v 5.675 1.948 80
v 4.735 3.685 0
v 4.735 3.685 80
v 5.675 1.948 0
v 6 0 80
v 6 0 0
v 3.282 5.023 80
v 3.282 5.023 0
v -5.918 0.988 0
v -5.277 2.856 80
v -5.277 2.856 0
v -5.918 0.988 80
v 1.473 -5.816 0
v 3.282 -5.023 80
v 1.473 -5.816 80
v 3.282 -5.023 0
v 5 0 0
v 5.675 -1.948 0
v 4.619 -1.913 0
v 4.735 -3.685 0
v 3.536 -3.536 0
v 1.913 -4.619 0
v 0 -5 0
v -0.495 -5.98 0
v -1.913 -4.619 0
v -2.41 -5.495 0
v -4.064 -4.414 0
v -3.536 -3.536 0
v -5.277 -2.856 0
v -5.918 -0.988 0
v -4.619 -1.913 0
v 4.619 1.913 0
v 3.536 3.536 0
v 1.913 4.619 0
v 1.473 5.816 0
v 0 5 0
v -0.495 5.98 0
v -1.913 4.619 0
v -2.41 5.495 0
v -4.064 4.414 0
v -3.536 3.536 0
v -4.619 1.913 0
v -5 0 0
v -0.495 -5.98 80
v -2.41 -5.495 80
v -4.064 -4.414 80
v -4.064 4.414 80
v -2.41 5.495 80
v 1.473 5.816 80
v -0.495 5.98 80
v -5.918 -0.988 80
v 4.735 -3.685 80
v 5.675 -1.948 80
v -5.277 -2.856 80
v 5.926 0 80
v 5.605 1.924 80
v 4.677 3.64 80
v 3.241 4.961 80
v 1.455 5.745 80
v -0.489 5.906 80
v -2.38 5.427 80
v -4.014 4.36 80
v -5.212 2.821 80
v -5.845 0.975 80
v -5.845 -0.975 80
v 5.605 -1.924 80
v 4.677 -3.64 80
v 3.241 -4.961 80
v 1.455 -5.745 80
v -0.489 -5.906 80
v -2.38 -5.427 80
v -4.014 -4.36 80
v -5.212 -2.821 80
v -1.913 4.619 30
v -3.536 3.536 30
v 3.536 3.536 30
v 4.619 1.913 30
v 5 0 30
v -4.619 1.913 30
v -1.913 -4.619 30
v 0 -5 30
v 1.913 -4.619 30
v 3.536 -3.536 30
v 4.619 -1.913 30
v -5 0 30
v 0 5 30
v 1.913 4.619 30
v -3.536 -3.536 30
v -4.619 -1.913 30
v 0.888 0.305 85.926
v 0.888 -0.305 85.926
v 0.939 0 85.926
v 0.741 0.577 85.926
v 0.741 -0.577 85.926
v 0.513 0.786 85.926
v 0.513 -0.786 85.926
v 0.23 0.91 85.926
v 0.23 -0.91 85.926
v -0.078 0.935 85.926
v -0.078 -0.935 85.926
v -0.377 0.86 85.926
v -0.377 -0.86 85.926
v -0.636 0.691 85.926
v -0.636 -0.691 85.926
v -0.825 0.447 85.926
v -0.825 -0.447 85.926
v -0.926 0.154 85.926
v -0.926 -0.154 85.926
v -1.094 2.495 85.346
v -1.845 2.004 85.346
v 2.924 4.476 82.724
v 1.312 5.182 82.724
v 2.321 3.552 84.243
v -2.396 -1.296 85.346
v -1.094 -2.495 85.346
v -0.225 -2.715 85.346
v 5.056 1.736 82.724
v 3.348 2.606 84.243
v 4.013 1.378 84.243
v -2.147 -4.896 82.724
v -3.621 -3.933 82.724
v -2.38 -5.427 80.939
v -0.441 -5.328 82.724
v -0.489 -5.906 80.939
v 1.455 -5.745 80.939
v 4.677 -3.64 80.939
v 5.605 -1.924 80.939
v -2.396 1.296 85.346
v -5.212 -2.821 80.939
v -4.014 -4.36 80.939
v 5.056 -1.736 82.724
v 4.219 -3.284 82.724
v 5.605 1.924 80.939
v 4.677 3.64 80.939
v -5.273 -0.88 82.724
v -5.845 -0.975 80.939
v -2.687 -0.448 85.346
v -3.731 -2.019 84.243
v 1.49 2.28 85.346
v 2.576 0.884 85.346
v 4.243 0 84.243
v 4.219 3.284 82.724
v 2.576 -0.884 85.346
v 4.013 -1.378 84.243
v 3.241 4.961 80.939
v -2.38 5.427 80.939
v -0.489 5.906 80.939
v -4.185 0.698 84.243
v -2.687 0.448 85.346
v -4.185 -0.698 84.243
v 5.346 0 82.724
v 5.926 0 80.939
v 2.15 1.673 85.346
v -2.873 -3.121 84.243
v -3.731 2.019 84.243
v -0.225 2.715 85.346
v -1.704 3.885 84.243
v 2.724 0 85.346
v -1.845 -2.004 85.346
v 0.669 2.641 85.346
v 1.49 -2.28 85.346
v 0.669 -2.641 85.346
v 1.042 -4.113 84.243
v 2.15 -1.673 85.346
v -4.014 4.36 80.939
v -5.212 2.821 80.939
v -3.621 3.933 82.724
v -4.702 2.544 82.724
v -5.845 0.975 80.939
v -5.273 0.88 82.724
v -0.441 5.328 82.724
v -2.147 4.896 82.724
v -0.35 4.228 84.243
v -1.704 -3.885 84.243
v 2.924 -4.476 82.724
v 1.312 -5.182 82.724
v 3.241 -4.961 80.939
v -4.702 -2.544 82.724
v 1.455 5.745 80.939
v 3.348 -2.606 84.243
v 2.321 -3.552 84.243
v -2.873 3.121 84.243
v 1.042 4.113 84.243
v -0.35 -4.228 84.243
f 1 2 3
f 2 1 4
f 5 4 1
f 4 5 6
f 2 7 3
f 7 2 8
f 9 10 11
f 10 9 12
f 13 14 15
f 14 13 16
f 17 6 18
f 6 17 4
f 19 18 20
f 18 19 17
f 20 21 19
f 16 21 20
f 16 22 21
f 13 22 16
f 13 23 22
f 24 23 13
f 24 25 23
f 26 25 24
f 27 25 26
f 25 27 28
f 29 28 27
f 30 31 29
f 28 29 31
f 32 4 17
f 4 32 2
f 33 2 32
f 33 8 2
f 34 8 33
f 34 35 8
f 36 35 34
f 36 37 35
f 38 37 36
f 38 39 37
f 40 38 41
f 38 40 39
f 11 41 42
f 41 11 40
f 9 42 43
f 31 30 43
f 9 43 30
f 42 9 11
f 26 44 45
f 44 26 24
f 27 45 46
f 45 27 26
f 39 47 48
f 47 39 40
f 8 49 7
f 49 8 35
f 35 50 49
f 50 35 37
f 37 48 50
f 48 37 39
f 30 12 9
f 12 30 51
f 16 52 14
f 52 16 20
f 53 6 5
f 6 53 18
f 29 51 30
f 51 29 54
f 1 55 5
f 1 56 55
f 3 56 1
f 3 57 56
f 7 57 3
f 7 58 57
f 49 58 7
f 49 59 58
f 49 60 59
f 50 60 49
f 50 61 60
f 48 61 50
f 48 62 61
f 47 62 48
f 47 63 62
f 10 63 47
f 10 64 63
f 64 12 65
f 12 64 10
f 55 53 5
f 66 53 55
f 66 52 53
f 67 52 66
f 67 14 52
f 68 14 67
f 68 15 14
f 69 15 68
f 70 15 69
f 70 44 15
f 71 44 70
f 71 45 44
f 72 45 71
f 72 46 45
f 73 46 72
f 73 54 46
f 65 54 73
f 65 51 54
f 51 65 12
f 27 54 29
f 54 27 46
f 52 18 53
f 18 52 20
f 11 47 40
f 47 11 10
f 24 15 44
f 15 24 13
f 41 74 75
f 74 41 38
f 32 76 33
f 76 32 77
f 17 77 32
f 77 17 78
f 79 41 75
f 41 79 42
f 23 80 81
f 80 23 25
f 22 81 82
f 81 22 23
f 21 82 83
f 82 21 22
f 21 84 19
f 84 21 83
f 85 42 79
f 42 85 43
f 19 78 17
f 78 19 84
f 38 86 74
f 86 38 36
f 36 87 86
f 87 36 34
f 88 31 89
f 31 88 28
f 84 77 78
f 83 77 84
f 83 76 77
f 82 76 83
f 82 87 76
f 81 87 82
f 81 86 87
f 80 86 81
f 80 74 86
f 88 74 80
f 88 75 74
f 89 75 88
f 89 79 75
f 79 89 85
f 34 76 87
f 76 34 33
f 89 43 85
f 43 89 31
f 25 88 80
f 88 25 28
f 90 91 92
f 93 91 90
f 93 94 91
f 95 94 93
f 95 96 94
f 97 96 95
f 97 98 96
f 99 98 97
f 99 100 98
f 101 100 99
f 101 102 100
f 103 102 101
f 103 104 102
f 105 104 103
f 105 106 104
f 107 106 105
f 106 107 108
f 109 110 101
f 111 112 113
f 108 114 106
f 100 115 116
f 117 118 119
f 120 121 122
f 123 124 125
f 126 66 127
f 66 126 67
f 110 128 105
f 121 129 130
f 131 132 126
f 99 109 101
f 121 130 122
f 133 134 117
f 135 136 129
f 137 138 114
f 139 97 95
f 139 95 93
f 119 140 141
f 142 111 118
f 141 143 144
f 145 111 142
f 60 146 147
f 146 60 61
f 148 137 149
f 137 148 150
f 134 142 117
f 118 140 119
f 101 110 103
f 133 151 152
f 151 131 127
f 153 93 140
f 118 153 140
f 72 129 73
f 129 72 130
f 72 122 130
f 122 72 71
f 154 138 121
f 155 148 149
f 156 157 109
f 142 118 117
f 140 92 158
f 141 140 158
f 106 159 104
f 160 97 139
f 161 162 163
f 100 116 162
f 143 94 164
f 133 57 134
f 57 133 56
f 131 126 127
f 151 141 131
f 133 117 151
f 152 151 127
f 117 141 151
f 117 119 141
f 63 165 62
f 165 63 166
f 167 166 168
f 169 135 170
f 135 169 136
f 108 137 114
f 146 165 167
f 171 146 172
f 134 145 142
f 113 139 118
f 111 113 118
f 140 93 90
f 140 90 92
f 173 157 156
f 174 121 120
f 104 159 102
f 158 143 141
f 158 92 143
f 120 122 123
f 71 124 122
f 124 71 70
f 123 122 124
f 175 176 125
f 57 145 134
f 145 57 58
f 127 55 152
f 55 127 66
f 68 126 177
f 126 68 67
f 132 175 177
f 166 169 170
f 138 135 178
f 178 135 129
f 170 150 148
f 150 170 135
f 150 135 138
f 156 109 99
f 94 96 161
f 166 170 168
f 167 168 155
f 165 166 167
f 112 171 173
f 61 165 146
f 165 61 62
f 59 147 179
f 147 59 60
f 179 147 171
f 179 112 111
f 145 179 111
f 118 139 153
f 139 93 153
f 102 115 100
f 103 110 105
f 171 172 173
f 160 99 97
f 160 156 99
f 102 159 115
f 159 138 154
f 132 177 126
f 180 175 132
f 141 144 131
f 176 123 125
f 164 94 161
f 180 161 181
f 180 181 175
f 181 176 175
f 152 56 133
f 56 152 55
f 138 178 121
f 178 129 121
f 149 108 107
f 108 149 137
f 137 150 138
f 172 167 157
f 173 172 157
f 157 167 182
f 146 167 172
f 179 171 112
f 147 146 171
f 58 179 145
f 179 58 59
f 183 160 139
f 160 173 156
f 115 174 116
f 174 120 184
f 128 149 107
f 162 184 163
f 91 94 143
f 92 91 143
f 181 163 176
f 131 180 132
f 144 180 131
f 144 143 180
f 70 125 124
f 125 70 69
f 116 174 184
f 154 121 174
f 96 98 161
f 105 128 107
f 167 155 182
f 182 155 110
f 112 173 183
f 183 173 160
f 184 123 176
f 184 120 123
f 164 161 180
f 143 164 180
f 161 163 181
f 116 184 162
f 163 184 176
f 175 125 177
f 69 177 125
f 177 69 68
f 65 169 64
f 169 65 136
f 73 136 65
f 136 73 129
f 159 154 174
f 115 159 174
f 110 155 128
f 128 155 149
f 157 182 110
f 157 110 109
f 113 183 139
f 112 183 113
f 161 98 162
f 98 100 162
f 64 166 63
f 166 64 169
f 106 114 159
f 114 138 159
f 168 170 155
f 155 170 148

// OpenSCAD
// thickness of the material around the pencil in mm
material_thickness = 1;
// extended length in mm
Handle_length = 50;
// defines how deep the pencil is going into the extender in mm
shaft_deepness = 30;
// Diameter of the pencil in mm
Pencil_diameter = 5;
union(){
  difference() {
    cylinder(r1=(Pencil_diameter + material_thickness), r2=(Pencil_diameter + material_thickness), h=(Handle_length + shaft_deepness), center=false);

    cylinder(r1=Pencil_diameter, r2=Pencil_diameter, h=shaft_deepness, center=false);
  }
  translate([0, 0, (Handle_length + shaft_deepness)]){
    sphere(r=(Pencil_diameter + material_thickness));
  }
}
